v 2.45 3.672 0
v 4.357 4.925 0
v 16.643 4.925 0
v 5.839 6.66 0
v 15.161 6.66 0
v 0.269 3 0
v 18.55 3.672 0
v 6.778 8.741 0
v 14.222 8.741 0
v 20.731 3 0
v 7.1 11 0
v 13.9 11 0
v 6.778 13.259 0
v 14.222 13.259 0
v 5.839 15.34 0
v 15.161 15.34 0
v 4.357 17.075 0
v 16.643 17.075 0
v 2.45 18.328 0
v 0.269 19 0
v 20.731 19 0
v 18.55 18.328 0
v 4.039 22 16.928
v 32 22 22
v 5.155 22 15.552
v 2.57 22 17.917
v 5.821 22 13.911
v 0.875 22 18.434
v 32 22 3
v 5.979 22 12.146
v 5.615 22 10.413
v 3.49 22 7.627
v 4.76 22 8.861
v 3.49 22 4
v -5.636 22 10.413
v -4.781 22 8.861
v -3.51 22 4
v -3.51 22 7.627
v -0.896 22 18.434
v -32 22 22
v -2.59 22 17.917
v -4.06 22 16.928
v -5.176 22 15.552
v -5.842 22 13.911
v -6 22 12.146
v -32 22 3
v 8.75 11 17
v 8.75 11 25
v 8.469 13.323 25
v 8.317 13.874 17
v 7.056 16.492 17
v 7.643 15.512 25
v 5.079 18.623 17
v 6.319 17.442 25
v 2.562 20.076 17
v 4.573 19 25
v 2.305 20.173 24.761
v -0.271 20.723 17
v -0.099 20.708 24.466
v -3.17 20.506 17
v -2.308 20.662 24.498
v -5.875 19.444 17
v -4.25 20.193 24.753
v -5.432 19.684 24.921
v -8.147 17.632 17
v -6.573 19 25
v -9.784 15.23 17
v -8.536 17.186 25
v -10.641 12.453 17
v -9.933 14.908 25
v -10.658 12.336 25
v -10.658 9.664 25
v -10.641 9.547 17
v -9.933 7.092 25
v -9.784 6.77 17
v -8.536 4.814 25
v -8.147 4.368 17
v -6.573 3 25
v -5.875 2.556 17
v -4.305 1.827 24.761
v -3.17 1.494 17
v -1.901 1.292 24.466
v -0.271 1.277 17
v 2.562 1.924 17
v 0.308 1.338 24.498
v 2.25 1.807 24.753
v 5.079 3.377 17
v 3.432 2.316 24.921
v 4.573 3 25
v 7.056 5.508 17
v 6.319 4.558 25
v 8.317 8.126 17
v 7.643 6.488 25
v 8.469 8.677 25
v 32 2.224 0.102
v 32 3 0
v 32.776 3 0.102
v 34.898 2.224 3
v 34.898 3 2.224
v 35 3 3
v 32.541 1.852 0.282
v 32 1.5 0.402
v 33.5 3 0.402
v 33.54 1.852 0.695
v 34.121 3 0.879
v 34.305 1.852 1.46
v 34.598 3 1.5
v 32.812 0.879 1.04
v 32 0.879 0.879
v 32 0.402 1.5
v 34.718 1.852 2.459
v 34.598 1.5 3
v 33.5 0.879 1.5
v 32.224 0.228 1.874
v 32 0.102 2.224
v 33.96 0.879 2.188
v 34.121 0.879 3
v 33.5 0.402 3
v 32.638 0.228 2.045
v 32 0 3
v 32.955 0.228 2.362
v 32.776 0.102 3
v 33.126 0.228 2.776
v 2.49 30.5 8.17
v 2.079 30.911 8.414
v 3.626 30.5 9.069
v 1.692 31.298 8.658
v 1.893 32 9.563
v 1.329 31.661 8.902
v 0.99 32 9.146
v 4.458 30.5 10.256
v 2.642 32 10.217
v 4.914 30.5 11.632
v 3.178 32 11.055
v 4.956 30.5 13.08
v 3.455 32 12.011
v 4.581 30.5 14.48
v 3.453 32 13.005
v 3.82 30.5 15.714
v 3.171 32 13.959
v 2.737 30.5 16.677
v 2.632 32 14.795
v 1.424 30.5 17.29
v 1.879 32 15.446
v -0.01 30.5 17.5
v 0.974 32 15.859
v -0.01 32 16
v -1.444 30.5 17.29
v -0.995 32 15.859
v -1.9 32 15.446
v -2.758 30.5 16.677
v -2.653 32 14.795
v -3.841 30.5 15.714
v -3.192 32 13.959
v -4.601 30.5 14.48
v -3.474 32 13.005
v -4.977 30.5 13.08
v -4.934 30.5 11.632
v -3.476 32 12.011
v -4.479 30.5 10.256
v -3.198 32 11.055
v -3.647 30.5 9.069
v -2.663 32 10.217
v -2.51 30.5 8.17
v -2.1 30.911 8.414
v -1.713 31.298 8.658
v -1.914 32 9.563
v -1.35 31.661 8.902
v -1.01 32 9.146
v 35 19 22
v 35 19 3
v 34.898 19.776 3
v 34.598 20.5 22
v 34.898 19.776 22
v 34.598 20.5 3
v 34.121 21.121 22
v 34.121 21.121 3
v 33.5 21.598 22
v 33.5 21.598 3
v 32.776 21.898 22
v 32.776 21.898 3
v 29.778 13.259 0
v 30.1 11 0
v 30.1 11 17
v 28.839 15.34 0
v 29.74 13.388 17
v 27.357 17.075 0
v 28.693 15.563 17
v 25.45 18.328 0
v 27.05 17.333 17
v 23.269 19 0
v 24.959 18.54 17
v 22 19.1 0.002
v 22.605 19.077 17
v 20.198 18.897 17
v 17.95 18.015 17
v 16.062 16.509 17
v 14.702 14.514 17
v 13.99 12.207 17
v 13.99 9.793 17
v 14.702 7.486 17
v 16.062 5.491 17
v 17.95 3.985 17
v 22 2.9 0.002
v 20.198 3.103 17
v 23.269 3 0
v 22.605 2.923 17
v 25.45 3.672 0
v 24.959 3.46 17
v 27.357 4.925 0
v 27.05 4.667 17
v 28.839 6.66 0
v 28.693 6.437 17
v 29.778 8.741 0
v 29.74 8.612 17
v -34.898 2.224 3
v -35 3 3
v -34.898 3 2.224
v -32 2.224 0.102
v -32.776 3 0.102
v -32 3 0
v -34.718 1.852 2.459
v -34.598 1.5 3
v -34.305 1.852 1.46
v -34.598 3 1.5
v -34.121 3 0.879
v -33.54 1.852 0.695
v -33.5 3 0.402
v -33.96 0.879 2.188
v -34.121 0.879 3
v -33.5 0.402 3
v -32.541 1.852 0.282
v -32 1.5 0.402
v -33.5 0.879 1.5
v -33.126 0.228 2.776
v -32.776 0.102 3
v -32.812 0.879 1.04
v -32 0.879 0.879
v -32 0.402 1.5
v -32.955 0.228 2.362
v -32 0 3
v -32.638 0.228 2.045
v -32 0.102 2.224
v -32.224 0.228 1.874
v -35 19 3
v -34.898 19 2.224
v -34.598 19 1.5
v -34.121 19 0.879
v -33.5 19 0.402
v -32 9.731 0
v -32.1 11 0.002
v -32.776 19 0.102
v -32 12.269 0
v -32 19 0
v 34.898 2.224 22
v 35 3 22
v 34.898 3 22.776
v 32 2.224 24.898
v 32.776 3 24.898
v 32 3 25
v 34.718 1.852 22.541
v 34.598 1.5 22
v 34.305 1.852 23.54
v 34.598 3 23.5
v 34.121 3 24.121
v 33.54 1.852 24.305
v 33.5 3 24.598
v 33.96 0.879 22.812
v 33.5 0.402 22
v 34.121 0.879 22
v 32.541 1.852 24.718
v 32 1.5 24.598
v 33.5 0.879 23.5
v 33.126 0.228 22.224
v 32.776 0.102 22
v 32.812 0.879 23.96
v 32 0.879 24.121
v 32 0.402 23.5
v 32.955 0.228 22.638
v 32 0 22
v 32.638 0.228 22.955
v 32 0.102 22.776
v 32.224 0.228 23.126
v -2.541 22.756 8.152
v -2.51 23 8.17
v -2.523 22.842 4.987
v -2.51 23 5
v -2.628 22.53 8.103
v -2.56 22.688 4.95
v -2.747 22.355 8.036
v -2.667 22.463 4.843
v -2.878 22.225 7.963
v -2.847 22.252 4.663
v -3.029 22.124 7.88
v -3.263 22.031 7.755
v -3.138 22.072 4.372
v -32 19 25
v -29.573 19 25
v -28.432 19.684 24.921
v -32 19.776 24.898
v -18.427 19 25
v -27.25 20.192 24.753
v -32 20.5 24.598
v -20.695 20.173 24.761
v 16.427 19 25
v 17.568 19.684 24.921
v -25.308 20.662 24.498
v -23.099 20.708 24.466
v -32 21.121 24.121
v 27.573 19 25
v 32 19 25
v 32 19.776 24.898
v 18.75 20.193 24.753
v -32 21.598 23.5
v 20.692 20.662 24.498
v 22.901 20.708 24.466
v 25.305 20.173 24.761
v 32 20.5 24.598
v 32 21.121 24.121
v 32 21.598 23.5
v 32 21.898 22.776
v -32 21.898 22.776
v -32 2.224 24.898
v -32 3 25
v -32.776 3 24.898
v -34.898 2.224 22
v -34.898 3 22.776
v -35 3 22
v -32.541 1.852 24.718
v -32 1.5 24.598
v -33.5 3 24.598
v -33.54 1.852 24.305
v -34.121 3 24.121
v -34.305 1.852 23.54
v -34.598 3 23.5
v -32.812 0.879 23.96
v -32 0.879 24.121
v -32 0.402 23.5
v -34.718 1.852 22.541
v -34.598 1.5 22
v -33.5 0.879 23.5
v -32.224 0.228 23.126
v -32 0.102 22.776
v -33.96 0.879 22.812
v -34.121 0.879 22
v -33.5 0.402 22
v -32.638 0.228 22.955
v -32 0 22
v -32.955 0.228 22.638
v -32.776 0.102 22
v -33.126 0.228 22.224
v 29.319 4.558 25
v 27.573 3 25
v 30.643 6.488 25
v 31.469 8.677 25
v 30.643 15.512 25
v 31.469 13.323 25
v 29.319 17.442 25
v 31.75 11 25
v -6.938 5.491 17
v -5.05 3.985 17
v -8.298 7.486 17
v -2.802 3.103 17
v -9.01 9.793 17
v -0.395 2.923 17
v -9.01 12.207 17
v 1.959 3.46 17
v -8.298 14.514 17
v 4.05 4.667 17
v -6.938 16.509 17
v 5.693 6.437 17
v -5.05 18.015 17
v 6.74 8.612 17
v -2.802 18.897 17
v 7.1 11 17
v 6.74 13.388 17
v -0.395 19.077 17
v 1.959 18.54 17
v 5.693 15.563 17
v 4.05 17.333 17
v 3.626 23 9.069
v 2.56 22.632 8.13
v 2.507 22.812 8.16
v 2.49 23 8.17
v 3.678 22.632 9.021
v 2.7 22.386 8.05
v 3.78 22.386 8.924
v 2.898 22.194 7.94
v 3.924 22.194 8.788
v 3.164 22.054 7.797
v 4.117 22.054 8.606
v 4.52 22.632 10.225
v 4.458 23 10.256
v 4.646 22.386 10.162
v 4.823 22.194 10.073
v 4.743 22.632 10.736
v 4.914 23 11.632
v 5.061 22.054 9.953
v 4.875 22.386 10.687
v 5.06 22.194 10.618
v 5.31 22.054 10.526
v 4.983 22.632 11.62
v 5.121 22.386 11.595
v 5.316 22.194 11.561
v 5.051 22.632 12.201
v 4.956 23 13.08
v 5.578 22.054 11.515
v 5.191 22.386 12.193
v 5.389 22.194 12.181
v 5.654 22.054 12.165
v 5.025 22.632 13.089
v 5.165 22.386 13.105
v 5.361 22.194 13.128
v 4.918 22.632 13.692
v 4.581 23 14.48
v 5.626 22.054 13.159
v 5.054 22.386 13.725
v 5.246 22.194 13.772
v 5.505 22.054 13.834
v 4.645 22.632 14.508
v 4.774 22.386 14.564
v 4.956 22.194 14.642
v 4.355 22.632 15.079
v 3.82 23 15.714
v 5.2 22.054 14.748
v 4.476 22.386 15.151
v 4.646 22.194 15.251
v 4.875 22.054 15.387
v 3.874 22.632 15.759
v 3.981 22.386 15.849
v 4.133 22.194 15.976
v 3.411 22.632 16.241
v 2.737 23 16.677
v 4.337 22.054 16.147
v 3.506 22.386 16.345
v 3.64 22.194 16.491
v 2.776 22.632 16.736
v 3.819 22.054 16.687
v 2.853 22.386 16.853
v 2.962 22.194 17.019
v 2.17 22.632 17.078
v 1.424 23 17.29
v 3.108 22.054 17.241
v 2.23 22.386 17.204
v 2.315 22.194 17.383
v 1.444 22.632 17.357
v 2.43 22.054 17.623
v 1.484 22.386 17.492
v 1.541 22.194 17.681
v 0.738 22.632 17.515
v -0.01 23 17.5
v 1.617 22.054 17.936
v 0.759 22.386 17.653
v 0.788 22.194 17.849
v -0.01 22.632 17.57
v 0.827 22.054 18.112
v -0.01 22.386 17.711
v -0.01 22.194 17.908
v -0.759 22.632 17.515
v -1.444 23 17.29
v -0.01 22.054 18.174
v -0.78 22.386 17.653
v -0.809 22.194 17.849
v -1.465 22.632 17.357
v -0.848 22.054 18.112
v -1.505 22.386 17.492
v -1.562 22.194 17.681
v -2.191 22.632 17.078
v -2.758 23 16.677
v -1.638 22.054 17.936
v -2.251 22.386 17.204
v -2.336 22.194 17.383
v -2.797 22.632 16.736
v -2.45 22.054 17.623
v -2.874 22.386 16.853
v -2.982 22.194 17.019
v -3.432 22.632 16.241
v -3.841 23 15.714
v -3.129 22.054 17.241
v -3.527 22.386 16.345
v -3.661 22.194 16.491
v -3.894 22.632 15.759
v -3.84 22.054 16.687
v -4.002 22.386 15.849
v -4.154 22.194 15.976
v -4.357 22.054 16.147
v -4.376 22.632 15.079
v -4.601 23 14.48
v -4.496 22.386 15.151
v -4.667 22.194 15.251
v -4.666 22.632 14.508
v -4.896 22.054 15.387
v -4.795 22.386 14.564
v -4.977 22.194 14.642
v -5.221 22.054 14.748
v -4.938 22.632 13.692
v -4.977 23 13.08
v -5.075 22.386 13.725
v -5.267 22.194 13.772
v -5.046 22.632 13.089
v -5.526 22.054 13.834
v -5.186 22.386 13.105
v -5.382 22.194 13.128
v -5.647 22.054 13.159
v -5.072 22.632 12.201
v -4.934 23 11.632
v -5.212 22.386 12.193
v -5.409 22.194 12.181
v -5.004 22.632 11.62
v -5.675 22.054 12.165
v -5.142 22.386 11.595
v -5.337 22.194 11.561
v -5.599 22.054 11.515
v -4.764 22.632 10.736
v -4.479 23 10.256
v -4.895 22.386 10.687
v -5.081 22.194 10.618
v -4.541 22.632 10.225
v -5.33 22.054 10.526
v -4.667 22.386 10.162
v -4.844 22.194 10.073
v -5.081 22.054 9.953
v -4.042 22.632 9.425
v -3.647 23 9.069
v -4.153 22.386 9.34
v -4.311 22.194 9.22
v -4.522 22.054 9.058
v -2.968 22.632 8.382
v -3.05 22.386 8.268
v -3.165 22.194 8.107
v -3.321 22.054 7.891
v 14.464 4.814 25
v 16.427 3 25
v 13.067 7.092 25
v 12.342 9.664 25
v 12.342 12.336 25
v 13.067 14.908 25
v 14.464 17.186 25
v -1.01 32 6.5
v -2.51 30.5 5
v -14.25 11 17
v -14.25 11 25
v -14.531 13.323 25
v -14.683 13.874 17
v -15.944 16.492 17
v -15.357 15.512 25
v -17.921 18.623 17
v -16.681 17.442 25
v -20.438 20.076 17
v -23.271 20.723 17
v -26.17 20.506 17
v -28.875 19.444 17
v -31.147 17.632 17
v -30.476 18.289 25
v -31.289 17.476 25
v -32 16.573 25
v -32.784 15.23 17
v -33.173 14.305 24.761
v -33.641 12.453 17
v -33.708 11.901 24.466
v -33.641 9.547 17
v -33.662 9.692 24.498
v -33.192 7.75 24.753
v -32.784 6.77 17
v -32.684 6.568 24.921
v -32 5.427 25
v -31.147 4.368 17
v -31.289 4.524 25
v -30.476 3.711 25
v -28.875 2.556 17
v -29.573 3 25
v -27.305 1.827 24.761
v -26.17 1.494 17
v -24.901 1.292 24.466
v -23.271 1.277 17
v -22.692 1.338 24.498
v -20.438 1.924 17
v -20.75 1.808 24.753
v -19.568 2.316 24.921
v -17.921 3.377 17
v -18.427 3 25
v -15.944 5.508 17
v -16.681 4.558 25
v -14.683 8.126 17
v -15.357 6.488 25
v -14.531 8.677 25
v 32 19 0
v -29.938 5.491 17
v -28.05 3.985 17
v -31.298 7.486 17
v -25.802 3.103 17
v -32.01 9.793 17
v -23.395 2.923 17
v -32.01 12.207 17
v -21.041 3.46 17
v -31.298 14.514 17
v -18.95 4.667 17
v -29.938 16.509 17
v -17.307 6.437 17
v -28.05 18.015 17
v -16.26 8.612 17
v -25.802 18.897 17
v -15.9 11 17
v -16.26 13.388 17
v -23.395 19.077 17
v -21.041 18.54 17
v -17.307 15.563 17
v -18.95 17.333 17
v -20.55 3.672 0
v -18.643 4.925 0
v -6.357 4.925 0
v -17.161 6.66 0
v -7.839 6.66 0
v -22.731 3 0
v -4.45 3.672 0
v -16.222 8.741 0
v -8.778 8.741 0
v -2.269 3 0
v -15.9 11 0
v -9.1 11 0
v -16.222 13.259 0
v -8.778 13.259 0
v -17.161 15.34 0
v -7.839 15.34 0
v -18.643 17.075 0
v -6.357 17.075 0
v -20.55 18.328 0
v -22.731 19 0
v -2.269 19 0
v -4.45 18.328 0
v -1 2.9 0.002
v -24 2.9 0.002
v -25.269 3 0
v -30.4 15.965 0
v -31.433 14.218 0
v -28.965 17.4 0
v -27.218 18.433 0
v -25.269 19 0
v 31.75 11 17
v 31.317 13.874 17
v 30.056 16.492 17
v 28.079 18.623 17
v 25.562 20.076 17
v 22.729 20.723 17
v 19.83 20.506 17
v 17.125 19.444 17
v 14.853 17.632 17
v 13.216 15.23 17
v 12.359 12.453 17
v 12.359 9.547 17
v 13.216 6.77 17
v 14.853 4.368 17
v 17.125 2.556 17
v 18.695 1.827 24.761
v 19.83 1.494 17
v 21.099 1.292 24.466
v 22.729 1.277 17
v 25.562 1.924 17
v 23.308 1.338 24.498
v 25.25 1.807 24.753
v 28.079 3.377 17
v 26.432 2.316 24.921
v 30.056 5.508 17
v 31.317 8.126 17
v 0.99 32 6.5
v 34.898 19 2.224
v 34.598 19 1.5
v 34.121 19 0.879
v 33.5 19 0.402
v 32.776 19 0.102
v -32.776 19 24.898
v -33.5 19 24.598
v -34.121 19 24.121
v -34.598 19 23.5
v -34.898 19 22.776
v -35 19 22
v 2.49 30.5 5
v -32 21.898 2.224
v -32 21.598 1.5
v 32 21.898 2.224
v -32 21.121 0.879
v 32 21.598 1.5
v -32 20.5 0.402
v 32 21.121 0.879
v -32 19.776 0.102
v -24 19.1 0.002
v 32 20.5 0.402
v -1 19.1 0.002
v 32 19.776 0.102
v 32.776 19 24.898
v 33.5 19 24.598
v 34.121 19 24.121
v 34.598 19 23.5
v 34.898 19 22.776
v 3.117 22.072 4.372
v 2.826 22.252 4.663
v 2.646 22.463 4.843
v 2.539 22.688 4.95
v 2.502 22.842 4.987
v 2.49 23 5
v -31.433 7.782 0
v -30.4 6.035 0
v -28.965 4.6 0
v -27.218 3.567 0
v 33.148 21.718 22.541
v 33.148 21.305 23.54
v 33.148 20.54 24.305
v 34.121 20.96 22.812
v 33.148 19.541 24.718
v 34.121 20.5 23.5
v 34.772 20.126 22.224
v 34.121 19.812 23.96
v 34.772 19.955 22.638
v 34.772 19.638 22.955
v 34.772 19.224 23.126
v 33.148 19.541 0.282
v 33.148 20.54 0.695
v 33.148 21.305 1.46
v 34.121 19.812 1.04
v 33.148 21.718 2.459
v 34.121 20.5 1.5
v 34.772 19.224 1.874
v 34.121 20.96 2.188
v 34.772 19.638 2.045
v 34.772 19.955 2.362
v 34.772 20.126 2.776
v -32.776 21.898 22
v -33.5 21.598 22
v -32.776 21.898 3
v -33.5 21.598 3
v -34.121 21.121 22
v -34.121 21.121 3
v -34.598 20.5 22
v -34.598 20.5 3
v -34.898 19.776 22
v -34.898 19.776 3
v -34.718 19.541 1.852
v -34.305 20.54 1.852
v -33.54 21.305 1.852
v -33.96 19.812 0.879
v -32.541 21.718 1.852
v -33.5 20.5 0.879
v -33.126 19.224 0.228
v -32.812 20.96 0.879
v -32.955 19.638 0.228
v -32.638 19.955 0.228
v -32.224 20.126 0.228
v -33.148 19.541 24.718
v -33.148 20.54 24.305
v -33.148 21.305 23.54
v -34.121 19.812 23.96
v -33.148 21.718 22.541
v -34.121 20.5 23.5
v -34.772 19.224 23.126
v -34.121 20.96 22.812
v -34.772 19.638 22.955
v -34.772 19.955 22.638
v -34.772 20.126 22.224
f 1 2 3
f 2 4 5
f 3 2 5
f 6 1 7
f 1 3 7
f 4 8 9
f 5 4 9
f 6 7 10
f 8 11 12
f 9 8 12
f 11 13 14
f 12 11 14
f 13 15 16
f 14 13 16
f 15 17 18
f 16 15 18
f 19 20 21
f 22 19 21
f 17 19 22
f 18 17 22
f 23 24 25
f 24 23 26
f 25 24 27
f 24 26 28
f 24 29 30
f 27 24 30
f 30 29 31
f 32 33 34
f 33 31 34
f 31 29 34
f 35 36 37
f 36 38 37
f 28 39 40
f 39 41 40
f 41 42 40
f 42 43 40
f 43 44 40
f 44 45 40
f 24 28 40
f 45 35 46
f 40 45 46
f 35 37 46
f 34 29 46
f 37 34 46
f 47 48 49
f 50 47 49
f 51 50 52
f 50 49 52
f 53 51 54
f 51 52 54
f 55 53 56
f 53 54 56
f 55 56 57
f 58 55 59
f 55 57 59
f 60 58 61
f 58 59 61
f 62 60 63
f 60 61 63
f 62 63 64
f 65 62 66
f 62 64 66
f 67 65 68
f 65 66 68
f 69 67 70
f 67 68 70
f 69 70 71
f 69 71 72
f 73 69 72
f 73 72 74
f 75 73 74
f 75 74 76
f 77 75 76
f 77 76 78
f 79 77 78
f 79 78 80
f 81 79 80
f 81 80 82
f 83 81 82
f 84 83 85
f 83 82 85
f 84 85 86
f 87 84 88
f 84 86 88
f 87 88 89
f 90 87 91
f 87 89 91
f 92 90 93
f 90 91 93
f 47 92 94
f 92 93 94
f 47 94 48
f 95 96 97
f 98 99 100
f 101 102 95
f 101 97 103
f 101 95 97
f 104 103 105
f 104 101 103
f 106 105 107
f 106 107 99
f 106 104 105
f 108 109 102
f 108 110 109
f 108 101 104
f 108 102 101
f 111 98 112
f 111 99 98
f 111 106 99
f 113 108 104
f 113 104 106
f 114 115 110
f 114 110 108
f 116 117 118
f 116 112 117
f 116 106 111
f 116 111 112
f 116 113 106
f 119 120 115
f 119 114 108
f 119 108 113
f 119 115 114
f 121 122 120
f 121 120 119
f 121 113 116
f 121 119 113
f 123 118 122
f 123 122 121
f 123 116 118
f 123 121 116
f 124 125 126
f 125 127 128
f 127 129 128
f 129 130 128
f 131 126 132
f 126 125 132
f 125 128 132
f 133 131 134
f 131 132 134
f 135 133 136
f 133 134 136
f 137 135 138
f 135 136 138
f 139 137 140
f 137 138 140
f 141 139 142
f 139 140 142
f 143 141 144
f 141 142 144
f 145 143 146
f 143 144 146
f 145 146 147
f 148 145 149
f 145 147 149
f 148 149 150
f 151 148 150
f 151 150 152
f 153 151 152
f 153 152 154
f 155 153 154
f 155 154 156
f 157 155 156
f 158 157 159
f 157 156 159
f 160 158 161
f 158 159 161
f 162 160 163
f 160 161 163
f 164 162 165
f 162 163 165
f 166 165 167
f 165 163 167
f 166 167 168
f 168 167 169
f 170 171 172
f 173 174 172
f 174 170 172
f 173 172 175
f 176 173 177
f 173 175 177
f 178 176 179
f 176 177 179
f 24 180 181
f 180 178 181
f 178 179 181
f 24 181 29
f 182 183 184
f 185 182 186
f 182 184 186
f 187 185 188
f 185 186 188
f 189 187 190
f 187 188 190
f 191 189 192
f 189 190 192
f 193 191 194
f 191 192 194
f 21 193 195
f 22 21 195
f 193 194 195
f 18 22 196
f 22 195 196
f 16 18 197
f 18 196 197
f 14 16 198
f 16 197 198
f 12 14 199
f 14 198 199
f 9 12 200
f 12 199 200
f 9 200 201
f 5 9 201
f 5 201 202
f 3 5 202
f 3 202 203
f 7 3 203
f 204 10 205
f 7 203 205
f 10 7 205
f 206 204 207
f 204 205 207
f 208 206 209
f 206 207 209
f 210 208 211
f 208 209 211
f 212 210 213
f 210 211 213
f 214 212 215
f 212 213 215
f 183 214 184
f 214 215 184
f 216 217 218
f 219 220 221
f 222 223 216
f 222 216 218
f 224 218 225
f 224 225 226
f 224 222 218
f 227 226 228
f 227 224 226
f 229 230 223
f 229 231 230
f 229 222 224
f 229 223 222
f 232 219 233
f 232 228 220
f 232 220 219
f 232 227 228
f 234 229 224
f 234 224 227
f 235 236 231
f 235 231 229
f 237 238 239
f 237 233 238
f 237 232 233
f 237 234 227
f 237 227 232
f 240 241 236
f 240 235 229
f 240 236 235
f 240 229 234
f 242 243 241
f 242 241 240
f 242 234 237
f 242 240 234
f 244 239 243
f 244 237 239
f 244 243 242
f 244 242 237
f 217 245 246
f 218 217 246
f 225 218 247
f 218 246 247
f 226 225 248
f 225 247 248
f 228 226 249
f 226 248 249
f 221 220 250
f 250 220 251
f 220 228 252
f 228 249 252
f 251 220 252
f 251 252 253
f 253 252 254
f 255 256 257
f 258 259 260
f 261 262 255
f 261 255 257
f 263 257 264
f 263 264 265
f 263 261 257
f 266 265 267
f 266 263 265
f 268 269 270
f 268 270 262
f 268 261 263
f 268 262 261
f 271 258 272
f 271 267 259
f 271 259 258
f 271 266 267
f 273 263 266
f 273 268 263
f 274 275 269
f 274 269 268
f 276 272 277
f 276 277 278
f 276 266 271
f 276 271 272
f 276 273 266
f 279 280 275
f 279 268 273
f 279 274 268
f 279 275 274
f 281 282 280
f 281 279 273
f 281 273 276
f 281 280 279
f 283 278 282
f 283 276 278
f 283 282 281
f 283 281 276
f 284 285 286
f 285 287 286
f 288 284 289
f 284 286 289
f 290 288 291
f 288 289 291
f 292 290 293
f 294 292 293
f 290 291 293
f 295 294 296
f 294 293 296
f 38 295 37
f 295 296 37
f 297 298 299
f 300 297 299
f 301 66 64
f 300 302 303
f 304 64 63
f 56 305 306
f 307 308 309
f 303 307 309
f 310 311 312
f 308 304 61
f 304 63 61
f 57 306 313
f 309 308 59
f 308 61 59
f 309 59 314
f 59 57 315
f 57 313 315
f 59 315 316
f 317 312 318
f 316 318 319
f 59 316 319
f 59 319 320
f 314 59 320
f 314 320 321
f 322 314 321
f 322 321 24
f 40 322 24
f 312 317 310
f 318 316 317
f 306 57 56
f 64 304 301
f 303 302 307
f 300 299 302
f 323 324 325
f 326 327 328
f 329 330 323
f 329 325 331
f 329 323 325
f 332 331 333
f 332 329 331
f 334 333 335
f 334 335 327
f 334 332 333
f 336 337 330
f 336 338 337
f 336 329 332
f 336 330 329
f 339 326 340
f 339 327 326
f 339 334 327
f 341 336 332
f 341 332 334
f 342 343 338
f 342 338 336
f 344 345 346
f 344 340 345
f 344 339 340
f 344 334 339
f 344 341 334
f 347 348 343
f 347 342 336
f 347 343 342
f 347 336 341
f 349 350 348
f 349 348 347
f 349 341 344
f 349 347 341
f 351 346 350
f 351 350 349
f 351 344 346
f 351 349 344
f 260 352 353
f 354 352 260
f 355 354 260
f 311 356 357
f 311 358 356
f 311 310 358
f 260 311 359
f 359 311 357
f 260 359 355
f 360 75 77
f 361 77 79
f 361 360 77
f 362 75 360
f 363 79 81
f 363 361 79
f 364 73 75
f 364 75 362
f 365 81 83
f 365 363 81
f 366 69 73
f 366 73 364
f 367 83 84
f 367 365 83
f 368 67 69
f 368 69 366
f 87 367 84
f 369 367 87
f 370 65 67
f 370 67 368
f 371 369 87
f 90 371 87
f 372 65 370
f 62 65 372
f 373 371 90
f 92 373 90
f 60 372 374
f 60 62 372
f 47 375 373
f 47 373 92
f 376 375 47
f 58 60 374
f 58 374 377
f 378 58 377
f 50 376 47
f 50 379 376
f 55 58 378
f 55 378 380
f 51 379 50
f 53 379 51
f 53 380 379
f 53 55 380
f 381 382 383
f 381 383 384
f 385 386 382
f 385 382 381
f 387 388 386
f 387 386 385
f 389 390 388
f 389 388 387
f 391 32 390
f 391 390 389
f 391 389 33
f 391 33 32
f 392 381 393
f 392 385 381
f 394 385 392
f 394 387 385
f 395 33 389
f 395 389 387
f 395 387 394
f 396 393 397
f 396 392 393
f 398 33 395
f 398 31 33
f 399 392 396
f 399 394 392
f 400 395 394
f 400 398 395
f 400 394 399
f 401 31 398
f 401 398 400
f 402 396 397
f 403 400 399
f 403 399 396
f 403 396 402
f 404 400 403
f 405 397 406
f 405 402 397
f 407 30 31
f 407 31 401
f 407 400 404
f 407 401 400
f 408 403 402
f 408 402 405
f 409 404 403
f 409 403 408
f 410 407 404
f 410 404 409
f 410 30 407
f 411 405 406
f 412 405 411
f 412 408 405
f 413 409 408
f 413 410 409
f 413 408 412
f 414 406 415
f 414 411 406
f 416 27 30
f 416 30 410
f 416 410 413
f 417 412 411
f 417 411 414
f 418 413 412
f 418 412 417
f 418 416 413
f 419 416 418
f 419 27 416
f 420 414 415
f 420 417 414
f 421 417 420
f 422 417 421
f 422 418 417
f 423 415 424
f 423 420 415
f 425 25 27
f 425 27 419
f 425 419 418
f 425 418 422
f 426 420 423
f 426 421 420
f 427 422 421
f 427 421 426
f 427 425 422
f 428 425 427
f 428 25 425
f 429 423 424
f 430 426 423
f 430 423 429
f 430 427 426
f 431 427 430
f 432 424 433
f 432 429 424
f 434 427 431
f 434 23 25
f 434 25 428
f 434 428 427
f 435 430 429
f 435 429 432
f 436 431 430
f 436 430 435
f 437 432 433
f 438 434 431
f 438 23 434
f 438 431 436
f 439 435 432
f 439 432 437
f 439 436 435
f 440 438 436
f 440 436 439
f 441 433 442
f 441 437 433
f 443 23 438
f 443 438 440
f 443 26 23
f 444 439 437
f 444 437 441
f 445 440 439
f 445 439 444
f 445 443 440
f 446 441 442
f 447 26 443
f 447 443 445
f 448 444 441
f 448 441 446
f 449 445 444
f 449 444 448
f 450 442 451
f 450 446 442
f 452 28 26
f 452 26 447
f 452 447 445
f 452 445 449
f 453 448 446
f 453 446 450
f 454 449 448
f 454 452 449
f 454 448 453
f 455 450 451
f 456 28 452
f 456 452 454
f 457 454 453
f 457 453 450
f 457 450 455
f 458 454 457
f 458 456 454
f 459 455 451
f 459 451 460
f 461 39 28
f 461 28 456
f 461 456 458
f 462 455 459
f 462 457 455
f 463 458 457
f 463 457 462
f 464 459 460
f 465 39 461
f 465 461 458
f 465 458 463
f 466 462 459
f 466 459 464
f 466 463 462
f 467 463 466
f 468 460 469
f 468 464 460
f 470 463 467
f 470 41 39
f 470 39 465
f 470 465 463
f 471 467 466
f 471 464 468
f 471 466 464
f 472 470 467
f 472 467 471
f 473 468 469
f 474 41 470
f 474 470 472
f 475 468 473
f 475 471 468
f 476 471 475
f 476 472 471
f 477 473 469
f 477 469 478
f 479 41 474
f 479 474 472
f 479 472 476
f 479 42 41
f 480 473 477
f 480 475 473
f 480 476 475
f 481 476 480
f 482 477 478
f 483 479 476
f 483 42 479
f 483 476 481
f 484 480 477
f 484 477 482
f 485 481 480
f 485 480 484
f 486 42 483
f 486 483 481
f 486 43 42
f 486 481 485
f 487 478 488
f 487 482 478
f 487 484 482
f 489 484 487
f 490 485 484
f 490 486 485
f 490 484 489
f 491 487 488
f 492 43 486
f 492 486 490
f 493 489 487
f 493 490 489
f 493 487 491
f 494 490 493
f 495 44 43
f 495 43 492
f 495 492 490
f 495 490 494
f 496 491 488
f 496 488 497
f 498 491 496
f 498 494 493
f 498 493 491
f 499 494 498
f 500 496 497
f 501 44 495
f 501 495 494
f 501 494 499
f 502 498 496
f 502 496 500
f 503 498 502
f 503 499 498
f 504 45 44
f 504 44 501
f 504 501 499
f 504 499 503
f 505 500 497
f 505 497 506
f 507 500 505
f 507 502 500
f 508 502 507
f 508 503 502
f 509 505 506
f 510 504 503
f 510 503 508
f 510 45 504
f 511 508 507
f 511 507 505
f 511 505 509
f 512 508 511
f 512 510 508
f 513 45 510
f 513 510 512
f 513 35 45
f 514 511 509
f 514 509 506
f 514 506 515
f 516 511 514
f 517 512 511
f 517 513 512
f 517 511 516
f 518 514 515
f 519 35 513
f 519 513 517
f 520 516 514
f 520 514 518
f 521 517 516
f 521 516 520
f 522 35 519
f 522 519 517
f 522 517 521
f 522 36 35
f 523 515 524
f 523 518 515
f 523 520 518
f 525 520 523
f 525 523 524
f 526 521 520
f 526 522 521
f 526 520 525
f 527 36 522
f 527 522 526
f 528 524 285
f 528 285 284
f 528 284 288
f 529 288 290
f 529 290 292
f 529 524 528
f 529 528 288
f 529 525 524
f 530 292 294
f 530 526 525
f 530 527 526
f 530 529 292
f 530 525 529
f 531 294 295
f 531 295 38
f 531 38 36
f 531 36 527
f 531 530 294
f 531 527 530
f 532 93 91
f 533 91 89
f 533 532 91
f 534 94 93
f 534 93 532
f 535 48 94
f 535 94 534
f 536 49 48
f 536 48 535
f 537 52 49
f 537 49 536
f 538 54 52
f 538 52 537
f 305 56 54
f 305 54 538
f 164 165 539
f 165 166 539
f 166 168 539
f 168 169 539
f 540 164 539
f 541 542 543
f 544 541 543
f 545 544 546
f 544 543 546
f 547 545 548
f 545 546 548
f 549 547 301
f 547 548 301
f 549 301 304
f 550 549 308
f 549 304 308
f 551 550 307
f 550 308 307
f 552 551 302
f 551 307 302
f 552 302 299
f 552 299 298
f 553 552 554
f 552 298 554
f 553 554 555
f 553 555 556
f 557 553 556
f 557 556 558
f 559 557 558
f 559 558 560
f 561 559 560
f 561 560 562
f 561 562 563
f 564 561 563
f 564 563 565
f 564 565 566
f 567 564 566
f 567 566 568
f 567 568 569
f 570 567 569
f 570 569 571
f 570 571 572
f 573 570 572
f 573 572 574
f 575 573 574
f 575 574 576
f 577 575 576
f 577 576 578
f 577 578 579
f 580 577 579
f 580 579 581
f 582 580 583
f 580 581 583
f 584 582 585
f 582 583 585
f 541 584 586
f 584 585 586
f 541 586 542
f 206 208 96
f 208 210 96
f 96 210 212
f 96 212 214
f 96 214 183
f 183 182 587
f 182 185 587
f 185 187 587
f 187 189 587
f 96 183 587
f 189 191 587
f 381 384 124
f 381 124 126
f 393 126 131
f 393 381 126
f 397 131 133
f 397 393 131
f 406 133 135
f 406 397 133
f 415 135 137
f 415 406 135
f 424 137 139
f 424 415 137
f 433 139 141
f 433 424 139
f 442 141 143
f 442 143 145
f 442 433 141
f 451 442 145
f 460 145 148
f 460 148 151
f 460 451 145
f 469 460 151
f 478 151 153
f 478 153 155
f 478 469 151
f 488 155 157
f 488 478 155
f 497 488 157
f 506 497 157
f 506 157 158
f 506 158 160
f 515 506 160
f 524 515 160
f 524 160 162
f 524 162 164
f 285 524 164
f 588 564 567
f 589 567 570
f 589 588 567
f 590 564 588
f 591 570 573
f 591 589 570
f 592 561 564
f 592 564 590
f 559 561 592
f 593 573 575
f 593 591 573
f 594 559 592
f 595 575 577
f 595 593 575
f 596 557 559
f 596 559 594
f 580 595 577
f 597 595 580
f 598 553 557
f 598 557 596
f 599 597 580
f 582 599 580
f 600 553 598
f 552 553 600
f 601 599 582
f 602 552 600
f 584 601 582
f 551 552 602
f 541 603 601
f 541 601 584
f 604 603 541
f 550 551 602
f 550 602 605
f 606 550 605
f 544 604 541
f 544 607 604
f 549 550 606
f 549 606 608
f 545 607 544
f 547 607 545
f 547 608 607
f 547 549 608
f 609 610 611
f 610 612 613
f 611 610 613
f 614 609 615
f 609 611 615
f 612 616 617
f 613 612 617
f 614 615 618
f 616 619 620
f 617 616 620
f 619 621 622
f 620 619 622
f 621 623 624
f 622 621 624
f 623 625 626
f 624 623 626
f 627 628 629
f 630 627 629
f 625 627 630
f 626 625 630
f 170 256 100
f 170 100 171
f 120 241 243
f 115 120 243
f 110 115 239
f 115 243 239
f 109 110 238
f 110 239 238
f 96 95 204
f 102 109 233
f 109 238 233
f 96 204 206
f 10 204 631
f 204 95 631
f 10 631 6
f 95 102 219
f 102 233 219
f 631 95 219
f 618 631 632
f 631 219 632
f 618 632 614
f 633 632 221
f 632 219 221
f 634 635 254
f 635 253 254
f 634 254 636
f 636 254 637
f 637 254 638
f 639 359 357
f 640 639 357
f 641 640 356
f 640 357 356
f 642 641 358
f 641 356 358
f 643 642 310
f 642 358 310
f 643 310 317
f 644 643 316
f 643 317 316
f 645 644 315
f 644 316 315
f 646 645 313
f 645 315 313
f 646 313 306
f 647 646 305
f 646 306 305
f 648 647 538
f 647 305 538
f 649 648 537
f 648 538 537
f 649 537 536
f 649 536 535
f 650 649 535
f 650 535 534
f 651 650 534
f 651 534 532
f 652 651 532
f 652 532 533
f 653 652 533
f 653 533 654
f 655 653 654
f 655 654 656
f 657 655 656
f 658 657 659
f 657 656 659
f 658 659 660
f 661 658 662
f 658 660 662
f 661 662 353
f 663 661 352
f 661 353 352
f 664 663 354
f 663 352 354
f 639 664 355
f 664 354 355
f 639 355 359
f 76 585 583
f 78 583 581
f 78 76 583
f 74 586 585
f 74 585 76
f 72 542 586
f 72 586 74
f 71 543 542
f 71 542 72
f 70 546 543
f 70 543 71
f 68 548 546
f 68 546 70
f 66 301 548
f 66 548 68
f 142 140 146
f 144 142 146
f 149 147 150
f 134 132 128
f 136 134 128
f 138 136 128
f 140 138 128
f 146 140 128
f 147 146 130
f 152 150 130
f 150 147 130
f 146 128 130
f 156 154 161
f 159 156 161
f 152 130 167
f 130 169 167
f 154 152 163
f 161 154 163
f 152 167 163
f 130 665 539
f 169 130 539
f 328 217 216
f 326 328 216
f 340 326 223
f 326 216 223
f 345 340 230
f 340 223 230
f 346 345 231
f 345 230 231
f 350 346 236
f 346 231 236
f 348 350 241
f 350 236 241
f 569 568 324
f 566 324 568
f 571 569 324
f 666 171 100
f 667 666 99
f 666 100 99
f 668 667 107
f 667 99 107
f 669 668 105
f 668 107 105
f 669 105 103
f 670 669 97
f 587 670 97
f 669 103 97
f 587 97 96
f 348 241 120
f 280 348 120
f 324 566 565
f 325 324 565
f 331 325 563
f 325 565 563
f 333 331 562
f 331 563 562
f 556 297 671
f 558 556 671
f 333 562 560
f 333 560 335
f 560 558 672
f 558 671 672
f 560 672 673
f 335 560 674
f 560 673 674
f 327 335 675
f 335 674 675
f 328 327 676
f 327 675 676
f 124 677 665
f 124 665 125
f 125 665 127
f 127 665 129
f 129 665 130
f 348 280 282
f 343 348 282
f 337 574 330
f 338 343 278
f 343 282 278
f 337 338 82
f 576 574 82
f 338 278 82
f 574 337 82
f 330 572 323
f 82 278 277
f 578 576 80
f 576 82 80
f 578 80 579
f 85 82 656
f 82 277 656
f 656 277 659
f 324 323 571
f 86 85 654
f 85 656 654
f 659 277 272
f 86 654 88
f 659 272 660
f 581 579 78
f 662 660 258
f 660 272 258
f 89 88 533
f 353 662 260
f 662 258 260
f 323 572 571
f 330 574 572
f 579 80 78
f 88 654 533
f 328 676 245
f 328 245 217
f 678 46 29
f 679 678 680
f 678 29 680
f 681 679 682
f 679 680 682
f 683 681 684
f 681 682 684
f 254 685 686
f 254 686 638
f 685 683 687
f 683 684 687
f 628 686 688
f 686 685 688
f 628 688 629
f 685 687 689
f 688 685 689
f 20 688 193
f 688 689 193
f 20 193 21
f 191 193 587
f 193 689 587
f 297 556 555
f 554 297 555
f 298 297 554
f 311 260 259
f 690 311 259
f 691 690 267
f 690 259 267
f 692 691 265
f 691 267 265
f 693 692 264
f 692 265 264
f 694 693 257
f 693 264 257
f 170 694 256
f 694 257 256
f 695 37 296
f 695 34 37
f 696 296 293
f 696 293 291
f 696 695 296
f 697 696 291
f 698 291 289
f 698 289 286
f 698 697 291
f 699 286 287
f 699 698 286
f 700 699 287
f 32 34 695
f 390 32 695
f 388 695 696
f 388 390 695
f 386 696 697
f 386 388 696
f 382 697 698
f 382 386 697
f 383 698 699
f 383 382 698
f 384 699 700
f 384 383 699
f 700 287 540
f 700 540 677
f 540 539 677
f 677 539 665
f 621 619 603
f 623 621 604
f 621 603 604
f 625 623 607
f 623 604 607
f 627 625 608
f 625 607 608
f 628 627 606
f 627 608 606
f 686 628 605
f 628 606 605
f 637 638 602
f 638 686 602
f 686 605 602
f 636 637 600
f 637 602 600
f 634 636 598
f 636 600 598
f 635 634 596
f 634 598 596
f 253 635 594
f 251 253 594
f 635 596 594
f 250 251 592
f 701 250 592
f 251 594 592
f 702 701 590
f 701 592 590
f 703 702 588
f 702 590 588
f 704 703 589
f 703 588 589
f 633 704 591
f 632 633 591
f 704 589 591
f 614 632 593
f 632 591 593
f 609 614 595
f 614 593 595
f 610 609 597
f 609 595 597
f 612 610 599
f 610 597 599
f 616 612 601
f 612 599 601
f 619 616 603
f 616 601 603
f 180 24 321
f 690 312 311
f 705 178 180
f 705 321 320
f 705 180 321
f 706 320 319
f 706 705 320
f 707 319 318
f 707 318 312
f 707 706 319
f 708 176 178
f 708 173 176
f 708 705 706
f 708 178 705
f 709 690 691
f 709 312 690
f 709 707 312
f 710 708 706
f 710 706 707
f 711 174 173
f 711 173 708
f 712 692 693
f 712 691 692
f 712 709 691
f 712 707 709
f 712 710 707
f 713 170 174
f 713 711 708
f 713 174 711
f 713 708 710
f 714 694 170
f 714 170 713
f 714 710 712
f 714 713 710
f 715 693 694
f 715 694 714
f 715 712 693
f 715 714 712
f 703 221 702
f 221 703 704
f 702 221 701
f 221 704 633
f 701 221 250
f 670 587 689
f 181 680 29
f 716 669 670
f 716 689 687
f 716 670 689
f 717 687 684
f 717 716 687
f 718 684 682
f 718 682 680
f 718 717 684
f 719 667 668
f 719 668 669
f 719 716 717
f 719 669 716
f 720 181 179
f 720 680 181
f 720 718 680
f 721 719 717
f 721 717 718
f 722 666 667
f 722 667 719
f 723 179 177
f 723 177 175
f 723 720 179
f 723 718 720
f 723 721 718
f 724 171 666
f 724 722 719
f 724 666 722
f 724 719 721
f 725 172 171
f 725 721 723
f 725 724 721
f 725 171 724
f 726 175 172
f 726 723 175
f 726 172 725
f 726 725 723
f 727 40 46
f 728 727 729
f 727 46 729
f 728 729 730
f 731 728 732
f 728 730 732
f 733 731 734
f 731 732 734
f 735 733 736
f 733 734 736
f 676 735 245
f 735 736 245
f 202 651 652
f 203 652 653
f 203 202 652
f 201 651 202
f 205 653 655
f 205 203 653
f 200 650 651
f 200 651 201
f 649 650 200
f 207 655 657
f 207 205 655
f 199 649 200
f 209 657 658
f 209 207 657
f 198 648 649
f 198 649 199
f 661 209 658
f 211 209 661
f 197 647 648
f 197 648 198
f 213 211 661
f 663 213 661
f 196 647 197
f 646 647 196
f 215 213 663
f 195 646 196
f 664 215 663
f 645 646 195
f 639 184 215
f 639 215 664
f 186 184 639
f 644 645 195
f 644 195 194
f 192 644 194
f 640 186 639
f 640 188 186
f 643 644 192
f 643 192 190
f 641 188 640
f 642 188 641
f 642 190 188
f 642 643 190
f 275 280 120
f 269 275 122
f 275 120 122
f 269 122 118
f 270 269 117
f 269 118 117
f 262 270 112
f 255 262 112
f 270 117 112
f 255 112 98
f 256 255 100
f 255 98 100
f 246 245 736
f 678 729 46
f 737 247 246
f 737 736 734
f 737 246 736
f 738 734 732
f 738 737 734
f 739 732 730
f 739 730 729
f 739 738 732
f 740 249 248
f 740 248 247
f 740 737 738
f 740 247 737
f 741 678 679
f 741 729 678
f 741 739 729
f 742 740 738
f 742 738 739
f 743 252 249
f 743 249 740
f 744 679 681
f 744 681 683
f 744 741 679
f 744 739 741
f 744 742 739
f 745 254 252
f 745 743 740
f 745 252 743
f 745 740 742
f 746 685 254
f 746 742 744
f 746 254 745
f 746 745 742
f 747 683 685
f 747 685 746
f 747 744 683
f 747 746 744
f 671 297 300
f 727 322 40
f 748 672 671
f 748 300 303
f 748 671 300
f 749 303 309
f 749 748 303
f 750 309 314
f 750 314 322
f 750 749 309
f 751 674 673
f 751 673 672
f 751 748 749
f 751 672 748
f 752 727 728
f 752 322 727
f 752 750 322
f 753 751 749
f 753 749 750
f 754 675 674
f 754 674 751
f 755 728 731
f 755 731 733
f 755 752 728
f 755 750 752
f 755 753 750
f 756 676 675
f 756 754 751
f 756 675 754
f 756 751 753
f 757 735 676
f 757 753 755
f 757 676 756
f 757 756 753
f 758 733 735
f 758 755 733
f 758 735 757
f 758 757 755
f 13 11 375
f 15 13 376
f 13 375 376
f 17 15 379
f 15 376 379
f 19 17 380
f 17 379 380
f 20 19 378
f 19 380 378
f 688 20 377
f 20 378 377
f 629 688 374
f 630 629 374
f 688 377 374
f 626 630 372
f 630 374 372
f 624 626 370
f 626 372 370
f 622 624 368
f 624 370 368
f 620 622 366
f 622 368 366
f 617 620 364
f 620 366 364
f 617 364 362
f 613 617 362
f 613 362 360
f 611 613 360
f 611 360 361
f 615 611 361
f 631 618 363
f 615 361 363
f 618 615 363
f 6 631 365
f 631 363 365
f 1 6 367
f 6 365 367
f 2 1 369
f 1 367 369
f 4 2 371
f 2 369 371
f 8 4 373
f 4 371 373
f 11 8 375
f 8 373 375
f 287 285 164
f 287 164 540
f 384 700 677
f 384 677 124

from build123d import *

# Parameters (mm, degrees)
BOSS_EXTRUDE1_DEPTH = 25
SKETCH2_R           = 8.1
CUT_EXTRUDE1_DEPTH  = 49.311489317
SKETCH3_R           = 9.75
CUT_EXTRUDE2_DEPTH  = 8
LPATTERN1_COUNT     = 3
LPATTERN1_PITCH     = 23
FILLET2_R           = 3
BOSS_EXTRUDE2_DEPTH = 10
CHAMFER1_SIZE       = 1.5
FILLET3_R           = 1


with BuildPart() as part:
    # Sketch1 → Boss-Extrude1 (new body)
    with BuildSketch(Plane.XY):
        Polygon((0, 0), (35, 0), (35, 22), (-35, 22), (-35, 0), align=None)
    extrude(amount=BOSS_EXTRUDE1_DEPTH)

    # Sketch2 → Cut-Extrude1 (cut, symmetric)
    with BuildSketch(Plane.XY.offset(25)):
        with Locations((-24, 11)):
            Circle(SKETCH2_R)
    cut_extrude1 = extrude(amount=CUT_EXTRUDE1_DEPTH, both=True, mode=Mode.SUBTRACT)

    # Sketch3 → Cut-Extrude2 (cut)
    with BuildSketch(Plane.XY.offset(25)):
        with Locations((-24, 11)):
            Circle(SKETCH3_R)
    cut_extrude2 = extrude(amount=-CUT_EXTRUDE2_DEPTH, mode=Mode.SUBTRACT)

    # LPattern1: Cut-Extrude1, Cut-Extrude2 ×3
    with Locations(*[(i * LPATTERN1_PITCH, 0, 0) for i in range(1, LPATTERN1_COUNT)]):
        add(cut_extrude1, mode=Mode.SUBTRACT)
        add(cut_extrude2, mode=Mode.SUBTRACT)

    # Fillet2
    # the kernel refuses this fillet: 3 mm, written as the material it takes off along each edge
    with BuildSketch(Plane(origin=(32, 3, 22), x_dir=(1, 0, 0), z_dir=(0, -1, 0))) as fillet2_piece_1_section:
        Polygon((0, 0), (FILLET2_R, 0), (FILLET2_R, FILLET2_R), (0, FILLET2_R), align=None)
    fillet2_piece_1 = extrude(amount=FILLET2_R, mode=Mode.PRIVATE)
    fillet2_piece_1 = fillet2_piece_1 - Plane(origin=(32, 3, 22), x_dir=(-0.7071067811865475, 0, -0.7071067811865475), z_dir=(0, -1, 0)) * Sphere(FILLET2_R, mode=Mode.PRIVATE)
    add(fillet2_piece_1, mode=Mode.SUBTRACT)
    with BuildSketch(Plane(origin=(32, 19, 22), x_dir=(0, 0, 1), z_dir=(1, 0, 0))) as fillet2_piece_2_section:
        Polygon((0, 0), (FILLET2_R, 0), (FILLET2_R, -FILLET2_R), (0, -FILLET2_R), align=None)
    fillet2_piece_2 = extrude(amount=FILLET2_R, mode=Mode.PRIVATE)
    fillet2_piece_2 = fillet2_piece_2 - Plane(origin=(32, 19, 22), x_dir=(0, -0.7071067811865475, -0.7071067811865475), z_dir=(1, 0, 0)) * Sphere(FILLET2_R, mode=Mode.PRIVATE)
    add(fillet2_piece_2, mode=Mode.SUBTRACT)
    with BuildSketch(Plane(origin=(-32, 19, 22), x_dir=(0, 0, 1), z_dir=(-1, 0, 0))) as fillet2_piece_3_section:
        Polygon((0, 0), (FILLET2_R, 0), (FILLET2_R, FILLET2_R), (0, FILLET2_R), align=None)
    fillet2_piece_3 = extrude(amount=FILLET2_R, mode=Mode.PRIVATE)
    fillet2_piece_3 = fillet2_piece_3 - Plane(origin=(-32, 19, 22), x_dir=(0, -0.7071067811865475, -0.7071067811865475), z_dir=(-1, 0, 0)) * Sphere(FILLET2_R, mode=Mode.PRIVATE)
    add(fillet2_piece_3, mode=Mode.SUBTRACT)
    with BuildSketch(Plane(origin=(-32, 3, 22), x_dir=(-1, 0, 0), z_dir=(0, -1, 0))) as fillet2_piece_4_section:
        Polygon((0, 0), (FILLET2_R, 0), (FILLET2_R, -FILLET2_R), (0, -FILLET2_R), align=None)
    fillet2_piece_4 = extrude(amount=FILLET2_R, mode=Mode.PRIVATE)
    fillet2_piece_4 = fillet2_piece_4 - Plane(origin=(-32, 3, 22), x_dir=(0.7071067811865475, 0, -0.7071067811865475), z_dir=(0, -1, 0)) * Sphere(FILLET2_R, mode=Mode.PRIVATE)
    add(fillet2_piece_4, mode=Mode.SUBTRACT)
    with BuildSketch(Plane(origin=(-32, 19, 3), x_dir=(-1, 0, 0), z_dir=(0, 0, -1))) as fillet2_piece_5_section:
        Polygon((0, 0), (FILLET2_R, 0), (FILLET2_R, FILLET2_R), (0, FILLET2_R), align=None)
    fillet2_piece_5 = extrude(amount=FILLET2_R, mode=Mode.PRIVATE)
    fillet2_piece_5 = fillet2_piece_5 - Plane(origin=(-32, 19, 3), x_dir=(0.7071067811865475, -0.7071067811865475, 0), z_dir=(0, 0, -1)) * Sphere(FILLET2_R, mode=Mode.PRIVATE)
    add(fillet2_piece_5, mode=Mode.SUBTRACT)
    with BuildSketch(Plane(origin=(-32, 3, 3), x_dir=(0, 0, -1), z_dir=(0, -1, 0))) as fillet2_piece_6_section:
        Polygon((0, 0), (FILLET2_R, 0), (FILLET2_R, -FILLET2_R), (0, -FILLET2_R), align=None)
    fillet2_piece_6 = extrude(amount=FILLET2_R, mode=Mode.PRIVATE)
    fillet2_piece_6 = fillet2_piece_6 - Plane(origin=(-32, 3, 3), x_dir=(0.7071067811865475, 0, 0.7071067811865475), z_dir=(0, -1, 0)) * Sphere(FILLET2_R, mode=Mode.PRIVATE)
    add(fillet2_piece_6, mode=Mode.SUBTRACT)
    with BuildSketch(Plane(origin=(32, 19, 3), x_dir=(0, 0, -1), z_dir=(1, 0, 0))) as fillet2_piece_7_section:
        Polygon((0, 0), (FILLET2_R, 0), (FILLET2_R, FILLET2_R), (0, FILLET2_R), align=None)
    fillet2_piece_7 = extrude(amount=FILLET2_R, mode=Mode.PRIVATE)
    fillet2_piece_7 = fillet2_piece_7 - Plane(origin=(32, 19, 3), x_dir=(0, -0.7071067811865475, 0.7071067811865475), z_dir=(1, 0, 0)) * Sphere(FILLET2_R, mode=Mode.PRIVATE)
    add(fillet2_piece_7, mode=Mode.SUBTRACT)
    with BuildSketch(Plane(origin=(32, 3, 3), x_dir=(1, 0, 0), z_dir=(0, -1, 0))) as fillet2_piece_8_section:
        Polygon((0, 0), (FILLET2_R, 0), (FILLET2_R, -FILLET2_R), (0, -FILLET2_R), align=None)
    fillet2_piece_8 = extrude(amount=FILLET2_R, mode=Mode.PRIVATE)
    fillet2_piece_8 = fillet2_piece_8 - Plane(origin=(32, 3, 3), x_dir=(-0.7071067811865475, 0, 0.7071067811865475), z_dir=(0, -1, 0)) * Sphere(FILLET2_R, mode=Mode.PRIVATE)
    add(fillet2_piece_8, mode=Mode.SUBTRACT)
    with BuildSketch(Plane(origin=(35, 3, 25), x_dir=(0, 0, -1), z_dir=(0, 1, 0)), Plane(origin=(-35, 19, 25), x_dir=(0, 0, -1), z_dir=(0, -1, 0)), Plane(origin=(-35, 19, 0), x_dir=(1, 0, 0), z_dir=(0, -1, 0))) as fillet2_piece_9:
        with BuildLine():
            CenterArc((FILLET2_R, FILLET2_R), FILLET2_R, 180, 90)
            Line((0, FILLET2_R), (0, 0))
            Line((0, 0), (FILLET2_R, 0))
        make_face()
    extrude(amount=16, mode=Mode.SUBTRACT)
    with BuildSketch(Plane(origin=(32, 22, 25), x_dir=(0, -1, 0), z_dir=(-1, 0, 0)), Plane(origin=(32, 0, 25), x_dir=(0, 0, -1), z_dir=(-1, 0, 0)), Plane(origin=(-32, 0, 0), x_dir=(0, 0, 1), z_dir=(1, 0, 0))) as fillet2_piece_10:
        with BuildLine():
            CenterArc((FILLET2_R, -FILLET2_R), FILLET2_R, 90, 90)
            Line((0, -FILLET2_R), (0, 0))
            Line((0, 0), (FILLET2_R, 0))
        make_face()
    extrude(amount=64, mode=Mode.SUBTRACT)
    with BuildSketch(Plane(origin=(32, 22, 0), x_dir=(0, -1, 0), z_dir=(-1, 0, 0))) as fillet2_piece_11:
        with BuildLine():
            CenterArc((FILLET2_R, FILLET2_R), FILLET2_R, 180, 90)
            Line((0, FILLET2_R), (0, 0))
            Line((0, 0), (FILLET2_R, 0))
        make_face()
    extrude(amount=64, mode=Mode.SUBTRACT)
    with BuildSketch(Plane(origin=(35, 3, 0), x_dir=(0, 0, 1), z_dir=(0, 1, 0))) as fillet2_piece_12:
        with BuildLine():
            CenterArc((FILLET2_R, -FILLET2_R), FILLET2_R, 90, 90)
            Line((0, -FILLET2_R), (0, 0))
            Line((0, 0), (FILLET2_R, 0))
        make_face()
    extrude(amount=16, mode=Mode.SUBTRACT)
    with BuildSketch(Plane(origin=(-35, 0, 3), x_dir=(1, 0, 0), z_dir=(0, 0, 1)), Plane(origin=(-35, 22, 3), x_dir=(0, -1, 0), z_dir=(0, 0, 1))) as fillet2_piece_13:
        with BuildLine():
            CenterArc((FILLET2_R, FILLET2_R), FILLET2_R, 180, 90)
            Line((0, FILLET2_R), (0, 0))
            Line((0, 0), (FILLET2_R, 0))
        make_face()
    extrude(amount=19, mode=Mode.SUBTRACT)
    with BuildSketch(Plane(origin=(35, 22, 3), x_dir=(0, -1, 0), z_dir=(0, 0, 1)), Plane(origin=(35, 0, 3), x_dir=(-1, 0, 0), z_dir=(0, 0, 1))) as fillet2_piece_14:
        with BuildLine():
            CenterArc((FILLET2_R, -FILLET2_R), FILLET2_R, 90, 90)
            Line((0, -FILLET2_R), (0, 0))
            Line((0, 0), (FILLET2_R, 0))
        make_face()
    extrude(amount=19, mode=Mode.SUBTRACT)

    # Sketch5 → Boss-Extrude2 (add)
    with BuildSketch(Plane(origin=(0, 22, 0), x_dir=(1, 0, 0), z_dir=(0, 1, 0))):
        with BuildLine():
            Line((-2.5104146, -8.169868643), (-2.5104146, -4.999995661))
            Line((-2.5104146, -4.999995661), (2.4895854, -4.999995661))
            Line((2.4895854, -4.999995661), (2.4895854, -8.169868643))
            ThreePointArc((2.4895854, -8.169868643), (-0.0104146, -17.499995661), (-2.5104146, -8.169868643))
        make_face()
    extrude(amount=BOSS_EXTRUDE2_DEPTH)

    # Chamfer1
    chamfer1_edges = [part.edges().sort_by_distance(p)[0] for p in [
        (2.4895854, 32, 6.584932152),
        (-0.0104146, 32, 4.999995661),
        (-2.5104146, 32, 6.584932152),
        (-0.0104146, 32, 17.499995661),
    ]]
    chamfer(chamfer1_edges, length=CHAMFER1_SIZE)

    # Fillet3
    fillet3_edges = [part.edges().sort_by_distance(p)[0] for p in [
        (2.4895854, 22, 6.584932152),
        (-0.0104146, 22, 4.999995661),
        (-2.5104146, 22, 6.584932152),
        (-0.0104146, 22, 17.499995661),
    ]]
    fillet(fillet3_edges, radius=FILLET3_R)


solid = part.part
